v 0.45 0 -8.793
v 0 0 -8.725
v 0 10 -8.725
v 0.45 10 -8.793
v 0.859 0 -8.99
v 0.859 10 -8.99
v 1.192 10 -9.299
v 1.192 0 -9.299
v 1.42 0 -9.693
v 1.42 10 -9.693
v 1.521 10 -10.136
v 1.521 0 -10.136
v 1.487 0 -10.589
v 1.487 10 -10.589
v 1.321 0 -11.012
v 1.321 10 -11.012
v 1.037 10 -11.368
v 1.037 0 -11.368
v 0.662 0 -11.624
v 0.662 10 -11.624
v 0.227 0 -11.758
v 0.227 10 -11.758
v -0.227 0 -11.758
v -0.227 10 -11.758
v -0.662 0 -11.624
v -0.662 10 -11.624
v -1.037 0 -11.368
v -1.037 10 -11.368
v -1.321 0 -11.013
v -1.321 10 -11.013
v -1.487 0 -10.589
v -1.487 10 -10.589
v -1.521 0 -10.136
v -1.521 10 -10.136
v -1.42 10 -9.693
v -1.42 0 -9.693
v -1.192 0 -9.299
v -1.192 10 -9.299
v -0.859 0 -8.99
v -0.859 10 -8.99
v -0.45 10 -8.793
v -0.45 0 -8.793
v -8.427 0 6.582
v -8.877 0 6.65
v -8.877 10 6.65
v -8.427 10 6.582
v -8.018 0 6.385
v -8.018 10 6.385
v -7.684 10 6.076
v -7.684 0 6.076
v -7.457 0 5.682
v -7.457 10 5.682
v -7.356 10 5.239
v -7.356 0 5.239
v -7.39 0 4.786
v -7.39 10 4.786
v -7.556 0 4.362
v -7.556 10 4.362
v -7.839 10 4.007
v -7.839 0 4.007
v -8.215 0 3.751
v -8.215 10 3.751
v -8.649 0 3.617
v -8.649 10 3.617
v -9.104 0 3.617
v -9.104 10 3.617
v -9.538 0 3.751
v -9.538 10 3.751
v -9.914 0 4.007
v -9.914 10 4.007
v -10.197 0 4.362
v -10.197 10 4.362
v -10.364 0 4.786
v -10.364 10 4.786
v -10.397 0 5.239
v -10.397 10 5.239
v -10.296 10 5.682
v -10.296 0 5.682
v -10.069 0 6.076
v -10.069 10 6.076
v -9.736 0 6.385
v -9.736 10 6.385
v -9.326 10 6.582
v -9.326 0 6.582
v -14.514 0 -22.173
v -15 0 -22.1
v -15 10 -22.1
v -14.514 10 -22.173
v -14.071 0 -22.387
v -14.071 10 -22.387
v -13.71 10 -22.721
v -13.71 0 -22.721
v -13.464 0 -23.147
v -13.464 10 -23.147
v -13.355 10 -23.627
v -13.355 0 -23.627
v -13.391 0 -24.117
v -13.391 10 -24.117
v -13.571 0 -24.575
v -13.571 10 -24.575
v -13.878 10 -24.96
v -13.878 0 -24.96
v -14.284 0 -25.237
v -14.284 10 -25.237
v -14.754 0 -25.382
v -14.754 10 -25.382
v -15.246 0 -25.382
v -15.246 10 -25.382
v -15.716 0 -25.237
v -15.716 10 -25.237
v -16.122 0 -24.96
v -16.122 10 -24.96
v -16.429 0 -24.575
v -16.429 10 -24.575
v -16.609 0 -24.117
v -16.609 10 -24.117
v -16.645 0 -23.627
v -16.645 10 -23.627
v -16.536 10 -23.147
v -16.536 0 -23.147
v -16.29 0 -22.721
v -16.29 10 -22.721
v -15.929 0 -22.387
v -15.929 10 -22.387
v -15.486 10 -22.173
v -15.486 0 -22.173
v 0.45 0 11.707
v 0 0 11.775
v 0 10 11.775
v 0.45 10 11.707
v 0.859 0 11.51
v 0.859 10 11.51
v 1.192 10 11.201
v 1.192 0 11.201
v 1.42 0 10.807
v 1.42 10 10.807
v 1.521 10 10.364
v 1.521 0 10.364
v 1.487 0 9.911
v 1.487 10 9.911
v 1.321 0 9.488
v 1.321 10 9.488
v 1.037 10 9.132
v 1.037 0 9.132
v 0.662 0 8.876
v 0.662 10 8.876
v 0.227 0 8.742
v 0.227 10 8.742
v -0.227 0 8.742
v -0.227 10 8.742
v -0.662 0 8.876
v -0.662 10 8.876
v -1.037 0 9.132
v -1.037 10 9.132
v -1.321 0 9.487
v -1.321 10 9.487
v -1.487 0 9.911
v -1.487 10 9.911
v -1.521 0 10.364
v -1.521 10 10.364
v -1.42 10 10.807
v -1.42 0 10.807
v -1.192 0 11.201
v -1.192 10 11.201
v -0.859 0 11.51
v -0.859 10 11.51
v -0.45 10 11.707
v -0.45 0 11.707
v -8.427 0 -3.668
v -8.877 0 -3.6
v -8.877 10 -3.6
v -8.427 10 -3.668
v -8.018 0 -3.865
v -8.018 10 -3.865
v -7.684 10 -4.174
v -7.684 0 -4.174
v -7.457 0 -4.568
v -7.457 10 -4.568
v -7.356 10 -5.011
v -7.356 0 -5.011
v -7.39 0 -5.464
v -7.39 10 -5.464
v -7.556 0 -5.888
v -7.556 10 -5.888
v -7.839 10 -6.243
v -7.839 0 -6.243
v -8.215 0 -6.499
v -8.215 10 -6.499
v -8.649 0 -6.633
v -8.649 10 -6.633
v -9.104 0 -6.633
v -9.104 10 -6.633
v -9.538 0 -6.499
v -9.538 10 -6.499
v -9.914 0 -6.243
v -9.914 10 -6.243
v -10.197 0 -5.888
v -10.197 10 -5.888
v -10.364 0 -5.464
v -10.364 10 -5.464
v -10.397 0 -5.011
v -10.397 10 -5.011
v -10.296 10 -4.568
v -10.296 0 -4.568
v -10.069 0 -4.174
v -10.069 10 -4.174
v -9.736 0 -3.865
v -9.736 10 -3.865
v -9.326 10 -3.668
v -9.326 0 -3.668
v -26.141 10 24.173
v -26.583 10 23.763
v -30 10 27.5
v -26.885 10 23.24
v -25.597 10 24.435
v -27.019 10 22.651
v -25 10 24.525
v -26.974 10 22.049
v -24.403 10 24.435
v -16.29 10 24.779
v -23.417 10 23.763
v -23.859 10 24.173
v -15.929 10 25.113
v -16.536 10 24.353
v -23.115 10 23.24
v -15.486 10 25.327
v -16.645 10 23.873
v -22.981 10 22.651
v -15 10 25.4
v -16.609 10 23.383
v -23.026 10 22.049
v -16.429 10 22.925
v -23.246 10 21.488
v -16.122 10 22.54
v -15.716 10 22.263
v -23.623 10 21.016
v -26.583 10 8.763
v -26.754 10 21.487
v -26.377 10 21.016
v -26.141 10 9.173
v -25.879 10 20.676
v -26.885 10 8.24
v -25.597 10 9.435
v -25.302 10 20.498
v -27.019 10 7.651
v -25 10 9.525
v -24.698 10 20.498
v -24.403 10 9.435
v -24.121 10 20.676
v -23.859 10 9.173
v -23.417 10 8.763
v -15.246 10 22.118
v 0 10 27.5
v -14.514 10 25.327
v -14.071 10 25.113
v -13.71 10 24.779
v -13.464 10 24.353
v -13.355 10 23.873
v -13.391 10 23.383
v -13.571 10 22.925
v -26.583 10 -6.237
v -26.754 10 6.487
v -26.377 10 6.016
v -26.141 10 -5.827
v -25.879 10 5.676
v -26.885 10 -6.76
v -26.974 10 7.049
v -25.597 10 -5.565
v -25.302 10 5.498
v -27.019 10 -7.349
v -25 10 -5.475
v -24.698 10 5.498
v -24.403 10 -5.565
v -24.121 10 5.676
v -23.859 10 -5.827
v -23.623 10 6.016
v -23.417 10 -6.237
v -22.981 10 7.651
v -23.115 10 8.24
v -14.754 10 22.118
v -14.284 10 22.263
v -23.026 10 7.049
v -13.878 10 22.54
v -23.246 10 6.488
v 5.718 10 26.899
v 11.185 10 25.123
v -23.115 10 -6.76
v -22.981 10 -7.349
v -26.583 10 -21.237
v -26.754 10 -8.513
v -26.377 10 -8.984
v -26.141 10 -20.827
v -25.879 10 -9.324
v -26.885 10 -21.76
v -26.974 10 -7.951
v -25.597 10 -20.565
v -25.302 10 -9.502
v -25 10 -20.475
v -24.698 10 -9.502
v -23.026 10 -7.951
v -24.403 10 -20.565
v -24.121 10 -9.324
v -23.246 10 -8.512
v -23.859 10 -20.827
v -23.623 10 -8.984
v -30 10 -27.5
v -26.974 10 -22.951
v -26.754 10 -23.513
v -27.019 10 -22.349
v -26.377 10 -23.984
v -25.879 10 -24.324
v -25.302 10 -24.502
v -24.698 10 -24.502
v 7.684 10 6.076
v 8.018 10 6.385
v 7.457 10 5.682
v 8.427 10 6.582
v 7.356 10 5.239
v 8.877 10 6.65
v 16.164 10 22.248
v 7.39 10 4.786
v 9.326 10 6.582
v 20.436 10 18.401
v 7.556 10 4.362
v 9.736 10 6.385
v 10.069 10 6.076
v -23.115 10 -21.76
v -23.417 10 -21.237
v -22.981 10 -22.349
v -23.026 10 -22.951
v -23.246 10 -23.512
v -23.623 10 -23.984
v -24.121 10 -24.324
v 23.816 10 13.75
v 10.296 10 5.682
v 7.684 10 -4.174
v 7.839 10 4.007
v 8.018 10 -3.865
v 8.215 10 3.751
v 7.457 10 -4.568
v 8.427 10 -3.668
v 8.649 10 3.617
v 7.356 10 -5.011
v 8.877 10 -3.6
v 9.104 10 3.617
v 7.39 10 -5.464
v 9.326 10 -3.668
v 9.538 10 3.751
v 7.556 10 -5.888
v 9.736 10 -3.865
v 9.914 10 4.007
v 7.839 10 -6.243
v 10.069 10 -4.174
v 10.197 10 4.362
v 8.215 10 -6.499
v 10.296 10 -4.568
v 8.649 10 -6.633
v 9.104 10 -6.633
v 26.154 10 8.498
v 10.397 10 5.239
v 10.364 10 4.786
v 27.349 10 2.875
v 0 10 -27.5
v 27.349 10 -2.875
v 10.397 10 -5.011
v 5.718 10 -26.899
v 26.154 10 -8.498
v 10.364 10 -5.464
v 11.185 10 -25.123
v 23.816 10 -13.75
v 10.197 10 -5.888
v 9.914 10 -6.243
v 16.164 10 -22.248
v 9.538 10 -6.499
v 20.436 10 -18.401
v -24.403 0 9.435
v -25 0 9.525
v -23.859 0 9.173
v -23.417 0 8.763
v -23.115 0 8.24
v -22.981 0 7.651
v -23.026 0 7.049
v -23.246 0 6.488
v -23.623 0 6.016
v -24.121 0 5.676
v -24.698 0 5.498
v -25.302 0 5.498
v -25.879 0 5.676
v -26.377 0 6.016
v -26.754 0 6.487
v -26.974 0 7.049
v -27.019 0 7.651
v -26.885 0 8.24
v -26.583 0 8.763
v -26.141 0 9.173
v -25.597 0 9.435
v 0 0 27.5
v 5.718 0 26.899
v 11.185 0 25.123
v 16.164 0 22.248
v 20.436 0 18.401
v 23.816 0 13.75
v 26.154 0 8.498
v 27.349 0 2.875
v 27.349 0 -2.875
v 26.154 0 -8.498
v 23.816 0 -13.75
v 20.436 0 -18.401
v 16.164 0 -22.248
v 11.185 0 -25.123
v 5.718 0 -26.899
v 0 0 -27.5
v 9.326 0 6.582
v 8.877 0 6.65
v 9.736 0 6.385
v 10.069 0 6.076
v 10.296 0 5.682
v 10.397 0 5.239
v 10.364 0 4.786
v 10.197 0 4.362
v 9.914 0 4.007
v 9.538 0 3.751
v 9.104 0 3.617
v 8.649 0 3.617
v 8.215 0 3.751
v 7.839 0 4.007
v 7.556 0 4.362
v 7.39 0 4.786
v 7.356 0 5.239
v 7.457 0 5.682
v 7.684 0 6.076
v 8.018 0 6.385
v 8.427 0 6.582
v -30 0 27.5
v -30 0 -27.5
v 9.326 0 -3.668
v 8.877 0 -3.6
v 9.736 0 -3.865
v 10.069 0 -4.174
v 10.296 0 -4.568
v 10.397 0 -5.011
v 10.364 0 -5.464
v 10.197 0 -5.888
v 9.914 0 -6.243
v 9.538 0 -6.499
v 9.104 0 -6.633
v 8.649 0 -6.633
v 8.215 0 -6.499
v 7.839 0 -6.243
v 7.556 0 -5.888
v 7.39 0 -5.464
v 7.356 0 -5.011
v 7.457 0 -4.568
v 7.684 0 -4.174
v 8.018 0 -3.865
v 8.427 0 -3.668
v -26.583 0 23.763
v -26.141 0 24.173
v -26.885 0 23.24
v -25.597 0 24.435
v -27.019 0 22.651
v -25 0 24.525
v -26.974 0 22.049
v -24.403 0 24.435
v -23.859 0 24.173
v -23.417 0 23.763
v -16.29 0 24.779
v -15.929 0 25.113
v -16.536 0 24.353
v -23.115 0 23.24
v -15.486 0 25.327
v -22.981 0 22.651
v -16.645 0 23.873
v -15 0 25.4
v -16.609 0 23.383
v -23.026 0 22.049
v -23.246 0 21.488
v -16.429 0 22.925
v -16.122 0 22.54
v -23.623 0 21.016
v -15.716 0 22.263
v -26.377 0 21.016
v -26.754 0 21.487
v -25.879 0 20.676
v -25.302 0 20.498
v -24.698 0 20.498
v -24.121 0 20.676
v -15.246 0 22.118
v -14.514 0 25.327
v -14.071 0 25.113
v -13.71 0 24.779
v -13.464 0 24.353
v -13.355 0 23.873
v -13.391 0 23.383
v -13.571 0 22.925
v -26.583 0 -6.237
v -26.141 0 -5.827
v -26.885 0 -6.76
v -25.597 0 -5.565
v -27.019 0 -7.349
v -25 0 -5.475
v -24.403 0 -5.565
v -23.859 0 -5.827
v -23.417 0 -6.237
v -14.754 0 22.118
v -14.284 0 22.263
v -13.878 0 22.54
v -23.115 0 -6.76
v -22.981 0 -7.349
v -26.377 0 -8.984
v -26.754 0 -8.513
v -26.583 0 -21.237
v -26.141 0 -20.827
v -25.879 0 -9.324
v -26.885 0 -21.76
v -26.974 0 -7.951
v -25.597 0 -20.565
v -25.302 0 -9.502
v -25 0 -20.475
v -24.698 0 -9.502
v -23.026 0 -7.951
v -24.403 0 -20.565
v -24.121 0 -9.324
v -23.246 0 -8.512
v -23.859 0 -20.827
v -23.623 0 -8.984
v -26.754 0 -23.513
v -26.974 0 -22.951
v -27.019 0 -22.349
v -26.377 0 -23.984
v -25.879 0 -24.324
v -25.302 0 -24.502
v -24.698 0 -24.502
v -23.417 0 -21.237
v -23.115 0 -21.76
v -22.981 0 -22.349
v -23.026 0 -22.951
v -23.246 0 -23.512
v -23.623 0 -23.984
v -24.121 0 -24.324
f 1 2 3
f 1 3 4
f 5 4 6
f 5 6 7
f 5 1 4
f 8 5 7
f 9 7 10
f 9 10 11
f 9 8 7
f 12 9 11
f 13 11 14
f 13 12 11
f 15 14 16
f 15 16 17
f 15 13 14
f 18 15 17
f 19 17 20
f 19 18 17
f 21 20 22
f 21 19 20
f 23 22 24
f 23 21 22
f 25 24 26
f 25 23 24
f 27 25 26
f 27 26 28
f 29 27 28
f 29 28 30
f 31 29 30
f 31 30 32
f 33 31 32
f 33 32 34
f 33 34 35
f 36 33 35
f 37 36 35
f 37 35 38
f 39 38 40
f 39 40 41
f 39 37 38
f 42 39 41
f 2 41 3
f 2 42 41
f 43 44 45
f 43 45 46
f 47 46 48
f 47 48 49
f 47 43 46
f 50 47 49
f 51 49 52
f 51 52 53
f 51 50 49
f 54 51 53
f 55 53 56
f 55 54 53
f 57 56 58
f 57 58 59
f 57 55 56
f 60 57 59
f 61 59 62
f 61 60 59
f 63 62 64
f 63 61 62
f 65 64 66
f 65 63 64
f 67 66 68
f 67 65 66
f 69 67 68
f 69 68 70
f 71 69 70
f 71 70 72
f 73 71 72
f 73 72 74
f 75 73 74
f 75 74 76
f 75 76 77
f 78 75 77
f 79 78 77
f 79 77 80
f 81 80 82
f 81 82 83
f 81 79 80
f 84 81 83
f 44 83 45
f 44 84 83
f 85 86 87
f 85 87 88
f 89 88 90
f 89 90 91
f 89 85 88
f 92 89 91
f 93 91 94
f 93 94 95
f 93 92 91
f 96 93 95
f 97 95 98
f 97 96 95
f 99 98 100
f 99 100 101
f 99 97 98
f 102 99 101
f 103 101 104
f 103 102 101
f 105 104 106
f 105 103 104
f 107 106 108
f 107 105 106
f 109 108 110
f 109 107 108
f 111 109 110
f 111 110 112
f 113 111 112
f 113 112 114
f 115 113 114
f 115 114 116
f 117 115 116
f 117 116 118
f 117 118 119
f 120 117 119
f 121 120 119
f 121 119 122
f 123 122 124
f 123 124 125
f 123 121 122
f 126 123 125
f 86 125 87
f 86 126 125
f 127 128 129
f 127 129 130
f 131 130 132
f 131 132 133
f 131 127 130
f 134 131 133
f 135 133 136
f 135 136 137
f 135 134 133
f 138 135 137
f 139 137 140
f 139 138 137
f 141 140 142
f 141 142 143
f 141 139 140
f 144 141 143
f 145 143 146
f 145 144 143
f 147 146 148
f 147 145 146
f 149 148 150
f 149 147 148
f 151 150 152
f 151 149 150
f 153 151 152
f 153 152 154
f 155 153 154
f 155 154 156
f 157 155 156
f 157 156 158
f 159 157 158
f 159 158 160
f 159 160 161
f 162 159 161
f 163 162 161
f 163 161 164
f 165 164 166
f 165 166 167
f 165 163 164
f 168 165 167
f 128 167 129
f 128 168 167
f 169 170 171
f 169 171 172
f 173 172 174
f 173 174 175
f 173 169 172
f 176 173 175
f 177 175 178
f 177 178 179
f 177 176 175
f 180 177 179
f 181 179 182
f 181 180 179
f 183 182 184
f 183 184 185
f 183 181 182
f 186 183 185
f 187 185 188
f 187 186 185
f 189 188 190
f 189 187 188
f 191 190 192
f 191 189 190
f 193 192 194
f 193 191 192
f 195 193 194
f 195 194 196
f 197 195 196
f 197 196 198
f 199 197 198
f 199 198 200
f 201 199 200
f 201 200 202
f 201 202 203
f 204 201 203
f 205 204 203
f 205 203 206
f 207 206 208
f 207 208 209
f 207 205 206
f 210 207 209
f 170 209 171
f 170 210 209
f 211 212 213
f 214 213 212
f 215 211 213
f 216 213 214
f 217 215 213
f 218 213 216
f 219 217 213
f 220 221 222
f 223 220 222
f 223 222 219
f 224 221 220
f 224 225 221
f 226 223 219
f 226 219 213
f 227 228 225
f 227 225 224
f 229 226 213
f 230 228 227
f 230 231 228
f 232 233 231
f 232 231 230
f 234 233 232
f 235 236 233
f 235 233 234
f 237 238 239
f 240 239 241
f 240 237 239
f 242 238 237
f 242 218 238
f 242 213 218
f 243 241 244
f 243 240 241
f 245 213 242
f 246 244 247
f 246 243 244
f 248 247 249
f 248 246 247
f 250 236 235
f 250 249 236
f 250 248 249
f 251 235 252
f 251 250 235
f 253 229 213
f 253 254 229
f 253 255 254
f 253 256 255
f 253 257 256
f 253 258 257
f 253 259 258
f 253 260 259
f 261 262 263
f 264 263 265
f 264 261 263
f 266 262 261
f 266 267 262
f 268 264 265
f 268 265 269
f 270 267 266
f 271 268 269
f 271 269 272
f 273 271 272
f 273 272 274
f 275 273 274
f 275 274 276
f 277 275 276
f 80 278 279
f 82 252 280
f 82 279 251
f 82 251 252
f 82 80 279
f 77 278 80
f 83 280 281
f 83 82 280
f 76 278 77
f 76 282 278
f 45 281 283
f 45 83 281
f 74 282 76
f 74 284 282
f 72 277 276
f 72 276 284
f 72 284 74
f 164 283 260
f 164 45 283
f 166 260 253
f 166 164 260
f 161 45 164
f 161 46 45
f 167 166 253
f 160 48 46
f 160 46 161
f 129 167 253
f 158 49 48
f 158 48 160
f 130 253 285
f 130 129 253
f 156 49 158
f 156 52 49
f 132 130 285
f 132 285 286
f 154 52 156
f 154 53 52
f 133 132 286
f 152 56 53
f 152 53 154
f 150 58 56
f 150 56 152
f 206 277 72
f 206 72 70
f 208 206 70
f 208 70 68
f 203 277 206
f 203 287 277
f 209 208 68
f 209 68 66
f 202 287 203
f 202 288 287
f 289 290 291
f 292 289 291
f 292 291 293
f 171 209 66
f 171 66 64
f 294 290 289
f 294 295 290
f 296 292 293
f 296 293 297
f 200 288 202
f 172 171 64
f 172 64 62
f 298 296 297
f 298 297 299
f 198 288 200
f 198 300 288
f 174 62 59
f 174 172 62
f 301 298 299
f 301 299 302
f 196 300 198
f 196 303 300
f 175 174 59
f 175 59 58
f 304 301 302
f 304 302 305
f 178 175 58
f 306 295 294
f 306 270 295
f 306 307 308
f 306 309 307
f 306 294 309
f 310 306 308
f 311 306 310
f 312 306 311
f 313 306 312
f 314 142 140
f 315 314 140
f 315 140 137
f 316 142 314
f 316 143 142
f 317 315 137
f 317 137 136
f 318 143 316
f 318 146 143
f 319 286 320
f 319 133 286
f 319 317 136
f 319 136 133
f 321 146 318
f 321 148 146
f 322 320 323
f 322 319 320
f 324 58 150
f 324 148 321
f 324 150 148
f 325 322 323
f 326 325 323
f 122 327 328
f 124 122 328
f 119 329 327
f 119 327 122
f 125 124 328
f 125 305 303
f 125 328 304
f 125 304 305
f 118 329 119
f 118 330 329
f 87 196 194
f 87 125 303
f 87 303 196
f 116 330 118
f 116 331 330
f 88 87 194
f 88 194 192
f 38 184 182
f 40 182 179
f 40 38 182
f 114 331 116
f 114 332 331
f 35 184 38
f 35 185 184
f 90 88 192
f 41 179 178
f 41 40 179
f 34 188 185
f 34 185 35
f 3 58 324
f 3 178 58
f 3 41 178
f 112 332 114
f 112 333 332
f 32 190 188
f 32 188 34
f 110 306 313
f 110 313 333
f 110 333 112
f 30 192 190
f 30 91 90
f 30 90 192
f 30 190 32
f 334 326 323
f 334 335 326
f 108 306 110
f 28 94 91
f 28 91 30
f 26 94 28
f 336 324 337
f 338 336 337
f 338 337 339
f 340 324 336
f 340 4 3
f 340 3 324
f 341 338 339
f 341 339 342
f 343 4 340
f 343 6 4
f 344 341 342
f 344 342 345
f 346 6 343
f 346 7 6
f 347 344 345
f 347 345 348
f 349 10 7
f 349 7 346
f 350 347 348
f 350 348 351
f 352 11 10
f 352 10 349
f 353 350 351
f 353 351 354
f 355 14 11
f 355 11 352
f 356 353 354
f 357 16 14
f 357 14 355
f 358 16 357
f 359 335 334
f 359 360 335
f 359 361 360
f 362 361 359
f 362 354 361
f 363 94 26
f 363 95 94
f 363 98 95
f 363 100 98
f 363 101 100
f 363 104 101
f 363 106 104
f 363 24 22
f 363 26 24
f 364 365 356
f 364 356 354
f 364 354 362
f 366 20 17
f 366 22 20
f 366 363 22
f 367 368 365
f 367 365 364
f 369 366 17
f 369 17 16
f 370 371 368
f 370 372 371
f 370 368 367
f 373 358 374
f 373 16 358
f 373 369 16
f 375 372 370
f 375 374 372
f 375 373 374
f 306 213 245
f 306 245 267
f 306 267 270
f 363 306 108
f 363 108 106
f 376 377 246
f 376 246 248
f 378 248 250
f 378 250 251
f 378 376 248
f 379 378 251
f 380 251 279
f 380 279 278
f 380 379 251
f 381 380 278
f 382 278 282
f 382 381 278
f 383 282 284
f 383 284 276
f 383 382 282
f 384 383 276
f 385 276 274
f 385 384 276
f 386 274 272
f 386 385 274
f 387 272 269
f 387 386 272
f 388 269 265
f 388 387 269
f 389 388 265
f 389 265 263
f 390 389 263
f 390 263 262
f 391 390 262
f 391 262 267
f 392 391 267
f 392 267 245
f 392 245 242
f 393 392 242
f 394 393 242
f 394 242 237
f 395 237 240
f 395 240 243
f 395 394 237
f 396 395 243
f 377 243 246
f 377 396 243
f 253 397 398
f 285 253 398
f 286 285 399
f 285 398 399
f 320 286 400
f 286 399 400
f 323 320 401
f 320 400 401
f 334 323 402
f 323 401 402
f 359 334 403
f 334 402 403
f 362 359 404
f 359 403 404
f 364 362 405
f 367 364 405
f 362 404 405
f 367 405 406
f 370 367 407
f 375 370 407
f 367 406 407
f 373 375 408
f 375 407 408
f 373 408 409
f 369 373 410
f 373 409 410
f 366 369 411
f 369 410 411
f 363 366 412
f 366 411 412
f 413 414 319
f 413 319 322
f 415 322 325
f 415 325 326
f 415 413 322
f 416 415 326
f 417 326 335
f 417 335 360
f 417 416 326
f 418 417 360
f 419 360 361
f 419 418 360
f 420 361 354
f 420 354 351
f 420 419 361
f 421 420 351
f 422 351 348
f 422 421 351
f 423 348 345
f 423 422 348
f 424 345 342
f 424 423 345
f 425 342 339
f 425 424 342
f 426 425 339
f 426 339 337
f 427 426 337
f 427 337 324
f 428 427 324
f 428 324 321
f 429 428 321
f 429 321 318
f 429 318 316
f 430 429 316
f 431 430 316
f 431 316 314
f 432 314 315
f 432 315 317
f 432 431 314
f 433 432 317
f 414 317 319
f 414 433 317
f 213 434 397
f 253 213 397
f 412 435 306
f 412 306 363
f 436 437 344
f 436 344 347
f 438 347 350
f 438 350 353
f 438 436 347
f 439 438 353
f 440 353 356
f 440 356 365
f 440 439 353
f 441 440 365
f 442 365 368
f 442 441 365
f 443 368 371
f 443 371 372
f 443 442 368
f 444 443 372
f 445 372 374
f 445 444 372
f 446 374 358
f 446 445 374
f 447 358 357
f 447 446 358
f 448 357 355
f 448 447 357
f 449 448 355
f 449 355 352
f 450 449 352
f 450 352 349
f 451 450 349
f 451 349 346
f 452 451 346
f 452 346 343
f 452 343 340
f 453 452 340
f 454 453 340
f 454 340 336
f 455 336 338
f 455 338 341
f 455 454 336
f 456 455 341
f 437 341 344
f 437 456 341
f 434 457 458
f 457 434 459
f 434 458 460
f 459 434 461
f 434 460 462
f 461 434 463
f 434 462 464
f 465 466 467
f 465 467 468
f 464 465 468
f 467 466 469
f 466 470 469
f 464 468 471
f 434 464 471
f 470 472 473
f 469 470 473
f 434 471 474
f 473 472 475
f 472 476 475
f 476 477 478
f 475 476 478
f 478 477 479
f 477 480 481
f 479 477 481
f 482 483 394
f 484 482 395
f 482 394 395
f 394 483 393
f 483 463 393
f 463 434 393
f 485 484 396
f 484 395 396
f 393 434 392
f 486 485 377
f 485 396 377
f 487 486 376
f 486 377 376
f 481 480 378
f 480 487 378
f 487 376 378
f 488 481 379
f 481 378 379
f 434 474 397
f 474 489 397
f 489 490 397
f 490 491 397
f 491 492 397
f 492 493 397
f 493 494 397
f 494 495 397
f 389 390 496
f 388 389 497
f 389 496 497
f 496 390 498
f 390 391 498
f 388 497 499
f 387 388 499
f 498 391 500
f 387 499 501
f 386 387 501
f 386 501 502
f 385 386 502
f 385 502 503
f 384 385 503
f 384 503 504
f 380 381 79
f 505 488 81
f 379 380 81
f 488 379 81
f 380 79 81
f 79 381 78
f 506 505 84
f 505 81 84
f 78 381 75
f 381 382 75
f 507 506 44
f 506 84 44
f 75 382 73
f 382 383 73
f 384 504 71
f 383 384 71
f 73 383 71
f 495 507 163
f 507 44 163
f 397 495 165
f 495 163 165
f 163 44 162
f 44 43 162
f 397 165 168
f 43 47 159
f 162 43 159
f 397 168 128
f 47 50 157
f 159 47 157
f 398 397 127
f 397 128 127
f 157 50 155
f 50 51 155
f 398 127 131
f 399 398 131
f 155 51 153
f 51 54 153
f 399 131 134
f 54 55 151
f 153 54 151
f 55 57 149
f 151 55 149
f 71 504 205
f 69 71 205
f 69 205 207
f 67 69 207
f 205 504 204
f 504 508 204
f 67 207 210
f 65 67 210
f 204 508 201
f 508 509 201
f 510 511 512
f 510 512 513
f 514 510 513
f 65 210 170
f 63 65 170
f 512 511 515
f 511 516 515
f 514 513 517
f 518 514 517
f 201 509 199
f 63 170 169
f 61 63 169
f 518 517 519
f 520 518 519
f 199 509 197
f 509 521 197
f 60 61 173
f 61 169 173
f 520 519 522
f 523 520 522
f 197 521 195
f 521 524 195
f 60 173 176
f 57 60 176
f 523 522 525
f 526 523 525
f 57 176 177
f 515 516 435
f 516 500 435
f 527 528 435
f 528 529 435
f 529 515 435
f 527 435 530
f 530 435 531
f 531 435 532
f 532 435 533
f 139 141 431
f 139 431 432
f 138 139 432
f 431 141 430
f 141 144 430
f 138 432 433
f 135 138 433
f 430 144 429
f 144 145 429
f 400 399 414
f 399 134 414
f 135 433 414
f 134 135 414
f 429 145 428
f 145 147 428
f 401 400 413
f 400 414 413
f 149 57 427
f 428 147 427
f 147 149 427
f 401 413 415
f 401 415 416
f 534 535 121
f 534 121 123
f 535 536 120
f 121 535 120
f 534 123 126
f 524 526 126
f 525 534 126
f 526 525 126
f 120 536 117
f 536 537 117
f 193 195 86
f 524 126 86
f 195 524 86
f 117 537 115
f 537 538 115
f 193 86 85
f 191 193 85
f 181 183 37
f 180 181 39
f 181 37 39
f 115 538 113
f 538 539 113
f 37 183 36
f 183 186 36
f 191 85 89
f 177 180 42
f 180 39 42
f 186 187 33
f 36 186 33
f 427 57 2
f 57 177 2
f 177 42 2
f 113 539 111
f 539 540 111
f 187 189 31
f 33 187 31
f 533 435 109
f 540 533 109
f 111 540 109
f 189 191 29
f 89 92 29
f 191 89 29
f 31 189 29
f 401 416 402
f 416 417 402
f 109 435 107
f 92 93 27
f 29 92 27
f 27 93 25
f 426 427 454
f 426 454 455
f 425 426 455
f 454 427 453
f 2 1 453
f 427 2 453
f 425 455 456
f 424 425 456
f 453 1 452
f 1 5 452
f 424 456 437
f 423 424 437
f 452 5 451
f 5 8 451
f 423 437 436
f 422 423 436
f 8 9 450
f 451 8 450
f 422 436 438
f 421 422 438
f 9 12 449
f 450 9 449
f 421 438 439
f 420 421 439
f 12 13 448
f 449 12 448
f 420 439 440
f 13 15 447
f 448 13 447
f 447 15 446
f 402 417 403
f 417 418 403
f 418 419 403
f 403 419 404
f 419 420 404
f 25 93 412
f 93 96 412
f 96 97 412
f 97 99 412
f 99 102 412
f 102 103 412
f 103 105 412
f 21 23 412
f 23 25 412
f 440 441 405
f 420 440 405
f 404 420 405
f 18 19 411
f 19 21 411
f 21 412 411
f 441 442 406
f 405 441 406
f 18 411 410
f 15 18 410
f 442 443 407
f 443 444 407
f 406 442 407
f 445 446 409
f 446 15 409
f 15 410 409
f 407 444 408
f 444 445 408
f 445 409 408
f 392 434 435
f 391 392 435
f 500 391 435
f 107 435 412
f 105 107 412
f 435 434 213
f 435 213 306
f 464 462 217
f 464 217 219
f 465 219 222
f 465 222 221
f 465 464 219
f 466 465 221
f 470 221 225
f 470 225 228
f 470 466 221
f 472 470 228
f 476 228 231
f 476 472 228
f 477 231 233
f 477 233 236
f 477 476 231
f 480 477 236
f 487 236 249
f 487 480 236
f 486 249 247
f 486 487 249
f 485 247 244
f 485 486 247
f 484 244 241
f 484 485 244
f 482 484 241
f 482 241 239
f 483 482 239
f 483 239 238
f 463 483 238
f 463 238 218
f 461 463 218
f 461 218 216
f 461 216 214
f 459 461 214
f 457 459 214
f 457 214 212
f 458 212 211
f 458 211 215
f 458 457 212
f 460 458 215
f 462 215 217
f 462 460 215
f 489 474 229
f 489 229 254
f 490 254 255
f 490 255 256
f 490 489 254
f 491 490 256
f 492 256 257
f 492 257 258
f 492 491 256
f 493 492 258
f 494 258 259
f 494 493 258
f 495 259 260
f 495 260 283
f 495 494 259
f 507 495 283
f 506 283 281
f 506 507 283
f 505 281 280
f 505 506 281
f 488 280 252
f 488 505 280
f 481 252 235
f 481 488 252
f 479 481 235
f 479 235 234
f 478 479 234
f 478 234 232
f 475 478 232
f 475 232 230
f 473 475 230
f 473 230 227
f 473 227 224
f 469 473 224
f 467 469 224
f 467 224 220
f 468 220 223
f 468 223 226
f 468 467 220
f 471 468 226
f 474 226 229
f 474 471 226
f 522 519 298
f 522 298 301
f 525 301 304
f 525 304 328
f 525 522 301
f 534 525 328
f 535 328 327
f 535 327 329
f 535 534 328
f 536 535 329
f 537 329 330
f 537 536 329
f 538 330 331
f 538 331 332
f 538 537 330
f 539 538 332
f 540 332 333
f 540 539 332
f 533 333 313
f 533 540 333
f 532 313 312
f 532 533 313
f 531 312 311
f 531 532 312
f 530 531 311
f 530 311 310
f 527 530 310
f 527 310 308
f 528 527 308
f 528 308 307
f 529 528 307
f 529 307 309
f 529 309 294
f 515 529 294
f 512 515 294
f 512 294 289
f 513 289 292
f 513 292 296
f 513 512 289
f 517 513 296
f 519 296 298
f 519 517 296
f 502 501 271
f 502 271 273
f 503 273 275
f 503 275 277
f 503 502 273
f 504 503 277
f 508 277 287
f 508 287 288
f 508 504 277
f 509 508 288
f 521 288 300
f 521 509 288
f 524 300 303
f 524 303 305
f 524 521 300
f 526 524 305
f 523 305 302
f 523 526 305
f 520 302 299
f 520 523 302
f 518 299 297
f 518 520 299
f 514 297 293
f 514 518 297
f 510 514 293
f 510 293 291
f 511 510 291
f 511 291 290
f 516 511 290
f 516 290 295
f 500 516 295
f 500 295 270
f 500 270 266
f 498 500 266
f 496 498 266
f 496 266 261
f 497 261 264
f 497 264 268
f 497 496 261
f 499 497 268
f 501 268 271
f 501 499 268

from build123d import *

# Parameters (mm, degrees)
SKETCH_1_R      = 1.65
SKETCH_1_R_2    = 1.525
SKETCH_1_W      = 10
SKETCH_1_H      = 55
SKETCH_1_R_3    = 2.025
EXTRUDE_1_DEPTH = 10


with BuildPart() as part:
    # 草图1 → 凸台-拉伸1 (new body)
    # profile 1 of 2: a face of its own
    with BuildSketch(Plane(origin=(0, 0, 0), x_dir=(1, 0, 0), z_dir=(0, 1, 0))):
        with BuildLine():
            ThreePointArc((0, -27.5), (27.5, 0), (0, 27.5))
            Line((0, 27.5), (-20, 27.5))
            Line((-20, 27.5), (-20, -27.5))
            Line((-20, -27.5), (0, -27.5))
        make_face()
        with Locations(Location((-15, -23.75, 0), (0, 0, 270))):
            Circle(SKETCH_1_R, mode=Mode.SUBTRACT)
        with Locations(Location((-8.876760389, -5.125, 0), (0, 0, 270))):
            Circle(SKETCH_1_R_2, mode=Mode.SUBTRACT)
        with Locations(Location((0, -10.25, 0), (0, 0, 270))):
            Circle(SKETCH_1_R_2, mode=Mode.SUBTRACT)
        with Locations(Location((8.876760389, -5.125, 0), (0, 0, 270))):
            Circle(SKETCH_1_R_2, mode=Mode.SUBTRACT)
        with Locations(Location((-8.876760389, 5.125, 0), (0, 0, 270))):
            Circle(SKETCH_1_R_2, mode=Mode.SUBTRACT)
        with Locations(Location((-15, 23.75, 0), (0, 0, 270))):
            Circle(SKETCH_1_R, mode=Mode.SUBTRACT)
        with Locations(Location((8.876760389, 5.125, 0), (0, 0, 270))):
            Circle(SKETCH_1_R_2, mode=Mode.SUBTRACT)
        with Locations(Location((0, 10.25, 0), (0, 0, 270))):
            Circle(SKETCH_1_R_2, mode=Mode.SUBTRACT)
    # profile 2 of 2: a face of its own
    with BuildSketch(Plane(origin=(0, 0, 0), x_dir=(1, 0, 0), z_dir=(0, 1, 0))):
        with Locations((-25, 0)):
            Rectangle(SKETCH_1_W, SKETCH_1_H)
        with Locations(Location((-25, -22.5, 0), (0, 0, 270))):
            Circle(SKETCH_1_R_3, mode=Mode.SUBTRACT)
        with Locations(Location((-25, -7.5, 0), (0, 0, 270))):
            Circle(SKETCH_1_R_3, mode=Mode.SUBTRACT)
        with Locations(Location((-25, 7.5, 0), (0, 0, 270))):
            Circle(SKETCH_1_R_3, mode=Mode.SUBTRACT)
        with Locations(Location((-25, 22.5, 0), (0, 0, 270))):
            Circle(SKETCH_1_R_3, mode=Mode.SUBTRACT)
    extrude(amount=EXTRUDE_1_DEPTH)


solid = part.part
